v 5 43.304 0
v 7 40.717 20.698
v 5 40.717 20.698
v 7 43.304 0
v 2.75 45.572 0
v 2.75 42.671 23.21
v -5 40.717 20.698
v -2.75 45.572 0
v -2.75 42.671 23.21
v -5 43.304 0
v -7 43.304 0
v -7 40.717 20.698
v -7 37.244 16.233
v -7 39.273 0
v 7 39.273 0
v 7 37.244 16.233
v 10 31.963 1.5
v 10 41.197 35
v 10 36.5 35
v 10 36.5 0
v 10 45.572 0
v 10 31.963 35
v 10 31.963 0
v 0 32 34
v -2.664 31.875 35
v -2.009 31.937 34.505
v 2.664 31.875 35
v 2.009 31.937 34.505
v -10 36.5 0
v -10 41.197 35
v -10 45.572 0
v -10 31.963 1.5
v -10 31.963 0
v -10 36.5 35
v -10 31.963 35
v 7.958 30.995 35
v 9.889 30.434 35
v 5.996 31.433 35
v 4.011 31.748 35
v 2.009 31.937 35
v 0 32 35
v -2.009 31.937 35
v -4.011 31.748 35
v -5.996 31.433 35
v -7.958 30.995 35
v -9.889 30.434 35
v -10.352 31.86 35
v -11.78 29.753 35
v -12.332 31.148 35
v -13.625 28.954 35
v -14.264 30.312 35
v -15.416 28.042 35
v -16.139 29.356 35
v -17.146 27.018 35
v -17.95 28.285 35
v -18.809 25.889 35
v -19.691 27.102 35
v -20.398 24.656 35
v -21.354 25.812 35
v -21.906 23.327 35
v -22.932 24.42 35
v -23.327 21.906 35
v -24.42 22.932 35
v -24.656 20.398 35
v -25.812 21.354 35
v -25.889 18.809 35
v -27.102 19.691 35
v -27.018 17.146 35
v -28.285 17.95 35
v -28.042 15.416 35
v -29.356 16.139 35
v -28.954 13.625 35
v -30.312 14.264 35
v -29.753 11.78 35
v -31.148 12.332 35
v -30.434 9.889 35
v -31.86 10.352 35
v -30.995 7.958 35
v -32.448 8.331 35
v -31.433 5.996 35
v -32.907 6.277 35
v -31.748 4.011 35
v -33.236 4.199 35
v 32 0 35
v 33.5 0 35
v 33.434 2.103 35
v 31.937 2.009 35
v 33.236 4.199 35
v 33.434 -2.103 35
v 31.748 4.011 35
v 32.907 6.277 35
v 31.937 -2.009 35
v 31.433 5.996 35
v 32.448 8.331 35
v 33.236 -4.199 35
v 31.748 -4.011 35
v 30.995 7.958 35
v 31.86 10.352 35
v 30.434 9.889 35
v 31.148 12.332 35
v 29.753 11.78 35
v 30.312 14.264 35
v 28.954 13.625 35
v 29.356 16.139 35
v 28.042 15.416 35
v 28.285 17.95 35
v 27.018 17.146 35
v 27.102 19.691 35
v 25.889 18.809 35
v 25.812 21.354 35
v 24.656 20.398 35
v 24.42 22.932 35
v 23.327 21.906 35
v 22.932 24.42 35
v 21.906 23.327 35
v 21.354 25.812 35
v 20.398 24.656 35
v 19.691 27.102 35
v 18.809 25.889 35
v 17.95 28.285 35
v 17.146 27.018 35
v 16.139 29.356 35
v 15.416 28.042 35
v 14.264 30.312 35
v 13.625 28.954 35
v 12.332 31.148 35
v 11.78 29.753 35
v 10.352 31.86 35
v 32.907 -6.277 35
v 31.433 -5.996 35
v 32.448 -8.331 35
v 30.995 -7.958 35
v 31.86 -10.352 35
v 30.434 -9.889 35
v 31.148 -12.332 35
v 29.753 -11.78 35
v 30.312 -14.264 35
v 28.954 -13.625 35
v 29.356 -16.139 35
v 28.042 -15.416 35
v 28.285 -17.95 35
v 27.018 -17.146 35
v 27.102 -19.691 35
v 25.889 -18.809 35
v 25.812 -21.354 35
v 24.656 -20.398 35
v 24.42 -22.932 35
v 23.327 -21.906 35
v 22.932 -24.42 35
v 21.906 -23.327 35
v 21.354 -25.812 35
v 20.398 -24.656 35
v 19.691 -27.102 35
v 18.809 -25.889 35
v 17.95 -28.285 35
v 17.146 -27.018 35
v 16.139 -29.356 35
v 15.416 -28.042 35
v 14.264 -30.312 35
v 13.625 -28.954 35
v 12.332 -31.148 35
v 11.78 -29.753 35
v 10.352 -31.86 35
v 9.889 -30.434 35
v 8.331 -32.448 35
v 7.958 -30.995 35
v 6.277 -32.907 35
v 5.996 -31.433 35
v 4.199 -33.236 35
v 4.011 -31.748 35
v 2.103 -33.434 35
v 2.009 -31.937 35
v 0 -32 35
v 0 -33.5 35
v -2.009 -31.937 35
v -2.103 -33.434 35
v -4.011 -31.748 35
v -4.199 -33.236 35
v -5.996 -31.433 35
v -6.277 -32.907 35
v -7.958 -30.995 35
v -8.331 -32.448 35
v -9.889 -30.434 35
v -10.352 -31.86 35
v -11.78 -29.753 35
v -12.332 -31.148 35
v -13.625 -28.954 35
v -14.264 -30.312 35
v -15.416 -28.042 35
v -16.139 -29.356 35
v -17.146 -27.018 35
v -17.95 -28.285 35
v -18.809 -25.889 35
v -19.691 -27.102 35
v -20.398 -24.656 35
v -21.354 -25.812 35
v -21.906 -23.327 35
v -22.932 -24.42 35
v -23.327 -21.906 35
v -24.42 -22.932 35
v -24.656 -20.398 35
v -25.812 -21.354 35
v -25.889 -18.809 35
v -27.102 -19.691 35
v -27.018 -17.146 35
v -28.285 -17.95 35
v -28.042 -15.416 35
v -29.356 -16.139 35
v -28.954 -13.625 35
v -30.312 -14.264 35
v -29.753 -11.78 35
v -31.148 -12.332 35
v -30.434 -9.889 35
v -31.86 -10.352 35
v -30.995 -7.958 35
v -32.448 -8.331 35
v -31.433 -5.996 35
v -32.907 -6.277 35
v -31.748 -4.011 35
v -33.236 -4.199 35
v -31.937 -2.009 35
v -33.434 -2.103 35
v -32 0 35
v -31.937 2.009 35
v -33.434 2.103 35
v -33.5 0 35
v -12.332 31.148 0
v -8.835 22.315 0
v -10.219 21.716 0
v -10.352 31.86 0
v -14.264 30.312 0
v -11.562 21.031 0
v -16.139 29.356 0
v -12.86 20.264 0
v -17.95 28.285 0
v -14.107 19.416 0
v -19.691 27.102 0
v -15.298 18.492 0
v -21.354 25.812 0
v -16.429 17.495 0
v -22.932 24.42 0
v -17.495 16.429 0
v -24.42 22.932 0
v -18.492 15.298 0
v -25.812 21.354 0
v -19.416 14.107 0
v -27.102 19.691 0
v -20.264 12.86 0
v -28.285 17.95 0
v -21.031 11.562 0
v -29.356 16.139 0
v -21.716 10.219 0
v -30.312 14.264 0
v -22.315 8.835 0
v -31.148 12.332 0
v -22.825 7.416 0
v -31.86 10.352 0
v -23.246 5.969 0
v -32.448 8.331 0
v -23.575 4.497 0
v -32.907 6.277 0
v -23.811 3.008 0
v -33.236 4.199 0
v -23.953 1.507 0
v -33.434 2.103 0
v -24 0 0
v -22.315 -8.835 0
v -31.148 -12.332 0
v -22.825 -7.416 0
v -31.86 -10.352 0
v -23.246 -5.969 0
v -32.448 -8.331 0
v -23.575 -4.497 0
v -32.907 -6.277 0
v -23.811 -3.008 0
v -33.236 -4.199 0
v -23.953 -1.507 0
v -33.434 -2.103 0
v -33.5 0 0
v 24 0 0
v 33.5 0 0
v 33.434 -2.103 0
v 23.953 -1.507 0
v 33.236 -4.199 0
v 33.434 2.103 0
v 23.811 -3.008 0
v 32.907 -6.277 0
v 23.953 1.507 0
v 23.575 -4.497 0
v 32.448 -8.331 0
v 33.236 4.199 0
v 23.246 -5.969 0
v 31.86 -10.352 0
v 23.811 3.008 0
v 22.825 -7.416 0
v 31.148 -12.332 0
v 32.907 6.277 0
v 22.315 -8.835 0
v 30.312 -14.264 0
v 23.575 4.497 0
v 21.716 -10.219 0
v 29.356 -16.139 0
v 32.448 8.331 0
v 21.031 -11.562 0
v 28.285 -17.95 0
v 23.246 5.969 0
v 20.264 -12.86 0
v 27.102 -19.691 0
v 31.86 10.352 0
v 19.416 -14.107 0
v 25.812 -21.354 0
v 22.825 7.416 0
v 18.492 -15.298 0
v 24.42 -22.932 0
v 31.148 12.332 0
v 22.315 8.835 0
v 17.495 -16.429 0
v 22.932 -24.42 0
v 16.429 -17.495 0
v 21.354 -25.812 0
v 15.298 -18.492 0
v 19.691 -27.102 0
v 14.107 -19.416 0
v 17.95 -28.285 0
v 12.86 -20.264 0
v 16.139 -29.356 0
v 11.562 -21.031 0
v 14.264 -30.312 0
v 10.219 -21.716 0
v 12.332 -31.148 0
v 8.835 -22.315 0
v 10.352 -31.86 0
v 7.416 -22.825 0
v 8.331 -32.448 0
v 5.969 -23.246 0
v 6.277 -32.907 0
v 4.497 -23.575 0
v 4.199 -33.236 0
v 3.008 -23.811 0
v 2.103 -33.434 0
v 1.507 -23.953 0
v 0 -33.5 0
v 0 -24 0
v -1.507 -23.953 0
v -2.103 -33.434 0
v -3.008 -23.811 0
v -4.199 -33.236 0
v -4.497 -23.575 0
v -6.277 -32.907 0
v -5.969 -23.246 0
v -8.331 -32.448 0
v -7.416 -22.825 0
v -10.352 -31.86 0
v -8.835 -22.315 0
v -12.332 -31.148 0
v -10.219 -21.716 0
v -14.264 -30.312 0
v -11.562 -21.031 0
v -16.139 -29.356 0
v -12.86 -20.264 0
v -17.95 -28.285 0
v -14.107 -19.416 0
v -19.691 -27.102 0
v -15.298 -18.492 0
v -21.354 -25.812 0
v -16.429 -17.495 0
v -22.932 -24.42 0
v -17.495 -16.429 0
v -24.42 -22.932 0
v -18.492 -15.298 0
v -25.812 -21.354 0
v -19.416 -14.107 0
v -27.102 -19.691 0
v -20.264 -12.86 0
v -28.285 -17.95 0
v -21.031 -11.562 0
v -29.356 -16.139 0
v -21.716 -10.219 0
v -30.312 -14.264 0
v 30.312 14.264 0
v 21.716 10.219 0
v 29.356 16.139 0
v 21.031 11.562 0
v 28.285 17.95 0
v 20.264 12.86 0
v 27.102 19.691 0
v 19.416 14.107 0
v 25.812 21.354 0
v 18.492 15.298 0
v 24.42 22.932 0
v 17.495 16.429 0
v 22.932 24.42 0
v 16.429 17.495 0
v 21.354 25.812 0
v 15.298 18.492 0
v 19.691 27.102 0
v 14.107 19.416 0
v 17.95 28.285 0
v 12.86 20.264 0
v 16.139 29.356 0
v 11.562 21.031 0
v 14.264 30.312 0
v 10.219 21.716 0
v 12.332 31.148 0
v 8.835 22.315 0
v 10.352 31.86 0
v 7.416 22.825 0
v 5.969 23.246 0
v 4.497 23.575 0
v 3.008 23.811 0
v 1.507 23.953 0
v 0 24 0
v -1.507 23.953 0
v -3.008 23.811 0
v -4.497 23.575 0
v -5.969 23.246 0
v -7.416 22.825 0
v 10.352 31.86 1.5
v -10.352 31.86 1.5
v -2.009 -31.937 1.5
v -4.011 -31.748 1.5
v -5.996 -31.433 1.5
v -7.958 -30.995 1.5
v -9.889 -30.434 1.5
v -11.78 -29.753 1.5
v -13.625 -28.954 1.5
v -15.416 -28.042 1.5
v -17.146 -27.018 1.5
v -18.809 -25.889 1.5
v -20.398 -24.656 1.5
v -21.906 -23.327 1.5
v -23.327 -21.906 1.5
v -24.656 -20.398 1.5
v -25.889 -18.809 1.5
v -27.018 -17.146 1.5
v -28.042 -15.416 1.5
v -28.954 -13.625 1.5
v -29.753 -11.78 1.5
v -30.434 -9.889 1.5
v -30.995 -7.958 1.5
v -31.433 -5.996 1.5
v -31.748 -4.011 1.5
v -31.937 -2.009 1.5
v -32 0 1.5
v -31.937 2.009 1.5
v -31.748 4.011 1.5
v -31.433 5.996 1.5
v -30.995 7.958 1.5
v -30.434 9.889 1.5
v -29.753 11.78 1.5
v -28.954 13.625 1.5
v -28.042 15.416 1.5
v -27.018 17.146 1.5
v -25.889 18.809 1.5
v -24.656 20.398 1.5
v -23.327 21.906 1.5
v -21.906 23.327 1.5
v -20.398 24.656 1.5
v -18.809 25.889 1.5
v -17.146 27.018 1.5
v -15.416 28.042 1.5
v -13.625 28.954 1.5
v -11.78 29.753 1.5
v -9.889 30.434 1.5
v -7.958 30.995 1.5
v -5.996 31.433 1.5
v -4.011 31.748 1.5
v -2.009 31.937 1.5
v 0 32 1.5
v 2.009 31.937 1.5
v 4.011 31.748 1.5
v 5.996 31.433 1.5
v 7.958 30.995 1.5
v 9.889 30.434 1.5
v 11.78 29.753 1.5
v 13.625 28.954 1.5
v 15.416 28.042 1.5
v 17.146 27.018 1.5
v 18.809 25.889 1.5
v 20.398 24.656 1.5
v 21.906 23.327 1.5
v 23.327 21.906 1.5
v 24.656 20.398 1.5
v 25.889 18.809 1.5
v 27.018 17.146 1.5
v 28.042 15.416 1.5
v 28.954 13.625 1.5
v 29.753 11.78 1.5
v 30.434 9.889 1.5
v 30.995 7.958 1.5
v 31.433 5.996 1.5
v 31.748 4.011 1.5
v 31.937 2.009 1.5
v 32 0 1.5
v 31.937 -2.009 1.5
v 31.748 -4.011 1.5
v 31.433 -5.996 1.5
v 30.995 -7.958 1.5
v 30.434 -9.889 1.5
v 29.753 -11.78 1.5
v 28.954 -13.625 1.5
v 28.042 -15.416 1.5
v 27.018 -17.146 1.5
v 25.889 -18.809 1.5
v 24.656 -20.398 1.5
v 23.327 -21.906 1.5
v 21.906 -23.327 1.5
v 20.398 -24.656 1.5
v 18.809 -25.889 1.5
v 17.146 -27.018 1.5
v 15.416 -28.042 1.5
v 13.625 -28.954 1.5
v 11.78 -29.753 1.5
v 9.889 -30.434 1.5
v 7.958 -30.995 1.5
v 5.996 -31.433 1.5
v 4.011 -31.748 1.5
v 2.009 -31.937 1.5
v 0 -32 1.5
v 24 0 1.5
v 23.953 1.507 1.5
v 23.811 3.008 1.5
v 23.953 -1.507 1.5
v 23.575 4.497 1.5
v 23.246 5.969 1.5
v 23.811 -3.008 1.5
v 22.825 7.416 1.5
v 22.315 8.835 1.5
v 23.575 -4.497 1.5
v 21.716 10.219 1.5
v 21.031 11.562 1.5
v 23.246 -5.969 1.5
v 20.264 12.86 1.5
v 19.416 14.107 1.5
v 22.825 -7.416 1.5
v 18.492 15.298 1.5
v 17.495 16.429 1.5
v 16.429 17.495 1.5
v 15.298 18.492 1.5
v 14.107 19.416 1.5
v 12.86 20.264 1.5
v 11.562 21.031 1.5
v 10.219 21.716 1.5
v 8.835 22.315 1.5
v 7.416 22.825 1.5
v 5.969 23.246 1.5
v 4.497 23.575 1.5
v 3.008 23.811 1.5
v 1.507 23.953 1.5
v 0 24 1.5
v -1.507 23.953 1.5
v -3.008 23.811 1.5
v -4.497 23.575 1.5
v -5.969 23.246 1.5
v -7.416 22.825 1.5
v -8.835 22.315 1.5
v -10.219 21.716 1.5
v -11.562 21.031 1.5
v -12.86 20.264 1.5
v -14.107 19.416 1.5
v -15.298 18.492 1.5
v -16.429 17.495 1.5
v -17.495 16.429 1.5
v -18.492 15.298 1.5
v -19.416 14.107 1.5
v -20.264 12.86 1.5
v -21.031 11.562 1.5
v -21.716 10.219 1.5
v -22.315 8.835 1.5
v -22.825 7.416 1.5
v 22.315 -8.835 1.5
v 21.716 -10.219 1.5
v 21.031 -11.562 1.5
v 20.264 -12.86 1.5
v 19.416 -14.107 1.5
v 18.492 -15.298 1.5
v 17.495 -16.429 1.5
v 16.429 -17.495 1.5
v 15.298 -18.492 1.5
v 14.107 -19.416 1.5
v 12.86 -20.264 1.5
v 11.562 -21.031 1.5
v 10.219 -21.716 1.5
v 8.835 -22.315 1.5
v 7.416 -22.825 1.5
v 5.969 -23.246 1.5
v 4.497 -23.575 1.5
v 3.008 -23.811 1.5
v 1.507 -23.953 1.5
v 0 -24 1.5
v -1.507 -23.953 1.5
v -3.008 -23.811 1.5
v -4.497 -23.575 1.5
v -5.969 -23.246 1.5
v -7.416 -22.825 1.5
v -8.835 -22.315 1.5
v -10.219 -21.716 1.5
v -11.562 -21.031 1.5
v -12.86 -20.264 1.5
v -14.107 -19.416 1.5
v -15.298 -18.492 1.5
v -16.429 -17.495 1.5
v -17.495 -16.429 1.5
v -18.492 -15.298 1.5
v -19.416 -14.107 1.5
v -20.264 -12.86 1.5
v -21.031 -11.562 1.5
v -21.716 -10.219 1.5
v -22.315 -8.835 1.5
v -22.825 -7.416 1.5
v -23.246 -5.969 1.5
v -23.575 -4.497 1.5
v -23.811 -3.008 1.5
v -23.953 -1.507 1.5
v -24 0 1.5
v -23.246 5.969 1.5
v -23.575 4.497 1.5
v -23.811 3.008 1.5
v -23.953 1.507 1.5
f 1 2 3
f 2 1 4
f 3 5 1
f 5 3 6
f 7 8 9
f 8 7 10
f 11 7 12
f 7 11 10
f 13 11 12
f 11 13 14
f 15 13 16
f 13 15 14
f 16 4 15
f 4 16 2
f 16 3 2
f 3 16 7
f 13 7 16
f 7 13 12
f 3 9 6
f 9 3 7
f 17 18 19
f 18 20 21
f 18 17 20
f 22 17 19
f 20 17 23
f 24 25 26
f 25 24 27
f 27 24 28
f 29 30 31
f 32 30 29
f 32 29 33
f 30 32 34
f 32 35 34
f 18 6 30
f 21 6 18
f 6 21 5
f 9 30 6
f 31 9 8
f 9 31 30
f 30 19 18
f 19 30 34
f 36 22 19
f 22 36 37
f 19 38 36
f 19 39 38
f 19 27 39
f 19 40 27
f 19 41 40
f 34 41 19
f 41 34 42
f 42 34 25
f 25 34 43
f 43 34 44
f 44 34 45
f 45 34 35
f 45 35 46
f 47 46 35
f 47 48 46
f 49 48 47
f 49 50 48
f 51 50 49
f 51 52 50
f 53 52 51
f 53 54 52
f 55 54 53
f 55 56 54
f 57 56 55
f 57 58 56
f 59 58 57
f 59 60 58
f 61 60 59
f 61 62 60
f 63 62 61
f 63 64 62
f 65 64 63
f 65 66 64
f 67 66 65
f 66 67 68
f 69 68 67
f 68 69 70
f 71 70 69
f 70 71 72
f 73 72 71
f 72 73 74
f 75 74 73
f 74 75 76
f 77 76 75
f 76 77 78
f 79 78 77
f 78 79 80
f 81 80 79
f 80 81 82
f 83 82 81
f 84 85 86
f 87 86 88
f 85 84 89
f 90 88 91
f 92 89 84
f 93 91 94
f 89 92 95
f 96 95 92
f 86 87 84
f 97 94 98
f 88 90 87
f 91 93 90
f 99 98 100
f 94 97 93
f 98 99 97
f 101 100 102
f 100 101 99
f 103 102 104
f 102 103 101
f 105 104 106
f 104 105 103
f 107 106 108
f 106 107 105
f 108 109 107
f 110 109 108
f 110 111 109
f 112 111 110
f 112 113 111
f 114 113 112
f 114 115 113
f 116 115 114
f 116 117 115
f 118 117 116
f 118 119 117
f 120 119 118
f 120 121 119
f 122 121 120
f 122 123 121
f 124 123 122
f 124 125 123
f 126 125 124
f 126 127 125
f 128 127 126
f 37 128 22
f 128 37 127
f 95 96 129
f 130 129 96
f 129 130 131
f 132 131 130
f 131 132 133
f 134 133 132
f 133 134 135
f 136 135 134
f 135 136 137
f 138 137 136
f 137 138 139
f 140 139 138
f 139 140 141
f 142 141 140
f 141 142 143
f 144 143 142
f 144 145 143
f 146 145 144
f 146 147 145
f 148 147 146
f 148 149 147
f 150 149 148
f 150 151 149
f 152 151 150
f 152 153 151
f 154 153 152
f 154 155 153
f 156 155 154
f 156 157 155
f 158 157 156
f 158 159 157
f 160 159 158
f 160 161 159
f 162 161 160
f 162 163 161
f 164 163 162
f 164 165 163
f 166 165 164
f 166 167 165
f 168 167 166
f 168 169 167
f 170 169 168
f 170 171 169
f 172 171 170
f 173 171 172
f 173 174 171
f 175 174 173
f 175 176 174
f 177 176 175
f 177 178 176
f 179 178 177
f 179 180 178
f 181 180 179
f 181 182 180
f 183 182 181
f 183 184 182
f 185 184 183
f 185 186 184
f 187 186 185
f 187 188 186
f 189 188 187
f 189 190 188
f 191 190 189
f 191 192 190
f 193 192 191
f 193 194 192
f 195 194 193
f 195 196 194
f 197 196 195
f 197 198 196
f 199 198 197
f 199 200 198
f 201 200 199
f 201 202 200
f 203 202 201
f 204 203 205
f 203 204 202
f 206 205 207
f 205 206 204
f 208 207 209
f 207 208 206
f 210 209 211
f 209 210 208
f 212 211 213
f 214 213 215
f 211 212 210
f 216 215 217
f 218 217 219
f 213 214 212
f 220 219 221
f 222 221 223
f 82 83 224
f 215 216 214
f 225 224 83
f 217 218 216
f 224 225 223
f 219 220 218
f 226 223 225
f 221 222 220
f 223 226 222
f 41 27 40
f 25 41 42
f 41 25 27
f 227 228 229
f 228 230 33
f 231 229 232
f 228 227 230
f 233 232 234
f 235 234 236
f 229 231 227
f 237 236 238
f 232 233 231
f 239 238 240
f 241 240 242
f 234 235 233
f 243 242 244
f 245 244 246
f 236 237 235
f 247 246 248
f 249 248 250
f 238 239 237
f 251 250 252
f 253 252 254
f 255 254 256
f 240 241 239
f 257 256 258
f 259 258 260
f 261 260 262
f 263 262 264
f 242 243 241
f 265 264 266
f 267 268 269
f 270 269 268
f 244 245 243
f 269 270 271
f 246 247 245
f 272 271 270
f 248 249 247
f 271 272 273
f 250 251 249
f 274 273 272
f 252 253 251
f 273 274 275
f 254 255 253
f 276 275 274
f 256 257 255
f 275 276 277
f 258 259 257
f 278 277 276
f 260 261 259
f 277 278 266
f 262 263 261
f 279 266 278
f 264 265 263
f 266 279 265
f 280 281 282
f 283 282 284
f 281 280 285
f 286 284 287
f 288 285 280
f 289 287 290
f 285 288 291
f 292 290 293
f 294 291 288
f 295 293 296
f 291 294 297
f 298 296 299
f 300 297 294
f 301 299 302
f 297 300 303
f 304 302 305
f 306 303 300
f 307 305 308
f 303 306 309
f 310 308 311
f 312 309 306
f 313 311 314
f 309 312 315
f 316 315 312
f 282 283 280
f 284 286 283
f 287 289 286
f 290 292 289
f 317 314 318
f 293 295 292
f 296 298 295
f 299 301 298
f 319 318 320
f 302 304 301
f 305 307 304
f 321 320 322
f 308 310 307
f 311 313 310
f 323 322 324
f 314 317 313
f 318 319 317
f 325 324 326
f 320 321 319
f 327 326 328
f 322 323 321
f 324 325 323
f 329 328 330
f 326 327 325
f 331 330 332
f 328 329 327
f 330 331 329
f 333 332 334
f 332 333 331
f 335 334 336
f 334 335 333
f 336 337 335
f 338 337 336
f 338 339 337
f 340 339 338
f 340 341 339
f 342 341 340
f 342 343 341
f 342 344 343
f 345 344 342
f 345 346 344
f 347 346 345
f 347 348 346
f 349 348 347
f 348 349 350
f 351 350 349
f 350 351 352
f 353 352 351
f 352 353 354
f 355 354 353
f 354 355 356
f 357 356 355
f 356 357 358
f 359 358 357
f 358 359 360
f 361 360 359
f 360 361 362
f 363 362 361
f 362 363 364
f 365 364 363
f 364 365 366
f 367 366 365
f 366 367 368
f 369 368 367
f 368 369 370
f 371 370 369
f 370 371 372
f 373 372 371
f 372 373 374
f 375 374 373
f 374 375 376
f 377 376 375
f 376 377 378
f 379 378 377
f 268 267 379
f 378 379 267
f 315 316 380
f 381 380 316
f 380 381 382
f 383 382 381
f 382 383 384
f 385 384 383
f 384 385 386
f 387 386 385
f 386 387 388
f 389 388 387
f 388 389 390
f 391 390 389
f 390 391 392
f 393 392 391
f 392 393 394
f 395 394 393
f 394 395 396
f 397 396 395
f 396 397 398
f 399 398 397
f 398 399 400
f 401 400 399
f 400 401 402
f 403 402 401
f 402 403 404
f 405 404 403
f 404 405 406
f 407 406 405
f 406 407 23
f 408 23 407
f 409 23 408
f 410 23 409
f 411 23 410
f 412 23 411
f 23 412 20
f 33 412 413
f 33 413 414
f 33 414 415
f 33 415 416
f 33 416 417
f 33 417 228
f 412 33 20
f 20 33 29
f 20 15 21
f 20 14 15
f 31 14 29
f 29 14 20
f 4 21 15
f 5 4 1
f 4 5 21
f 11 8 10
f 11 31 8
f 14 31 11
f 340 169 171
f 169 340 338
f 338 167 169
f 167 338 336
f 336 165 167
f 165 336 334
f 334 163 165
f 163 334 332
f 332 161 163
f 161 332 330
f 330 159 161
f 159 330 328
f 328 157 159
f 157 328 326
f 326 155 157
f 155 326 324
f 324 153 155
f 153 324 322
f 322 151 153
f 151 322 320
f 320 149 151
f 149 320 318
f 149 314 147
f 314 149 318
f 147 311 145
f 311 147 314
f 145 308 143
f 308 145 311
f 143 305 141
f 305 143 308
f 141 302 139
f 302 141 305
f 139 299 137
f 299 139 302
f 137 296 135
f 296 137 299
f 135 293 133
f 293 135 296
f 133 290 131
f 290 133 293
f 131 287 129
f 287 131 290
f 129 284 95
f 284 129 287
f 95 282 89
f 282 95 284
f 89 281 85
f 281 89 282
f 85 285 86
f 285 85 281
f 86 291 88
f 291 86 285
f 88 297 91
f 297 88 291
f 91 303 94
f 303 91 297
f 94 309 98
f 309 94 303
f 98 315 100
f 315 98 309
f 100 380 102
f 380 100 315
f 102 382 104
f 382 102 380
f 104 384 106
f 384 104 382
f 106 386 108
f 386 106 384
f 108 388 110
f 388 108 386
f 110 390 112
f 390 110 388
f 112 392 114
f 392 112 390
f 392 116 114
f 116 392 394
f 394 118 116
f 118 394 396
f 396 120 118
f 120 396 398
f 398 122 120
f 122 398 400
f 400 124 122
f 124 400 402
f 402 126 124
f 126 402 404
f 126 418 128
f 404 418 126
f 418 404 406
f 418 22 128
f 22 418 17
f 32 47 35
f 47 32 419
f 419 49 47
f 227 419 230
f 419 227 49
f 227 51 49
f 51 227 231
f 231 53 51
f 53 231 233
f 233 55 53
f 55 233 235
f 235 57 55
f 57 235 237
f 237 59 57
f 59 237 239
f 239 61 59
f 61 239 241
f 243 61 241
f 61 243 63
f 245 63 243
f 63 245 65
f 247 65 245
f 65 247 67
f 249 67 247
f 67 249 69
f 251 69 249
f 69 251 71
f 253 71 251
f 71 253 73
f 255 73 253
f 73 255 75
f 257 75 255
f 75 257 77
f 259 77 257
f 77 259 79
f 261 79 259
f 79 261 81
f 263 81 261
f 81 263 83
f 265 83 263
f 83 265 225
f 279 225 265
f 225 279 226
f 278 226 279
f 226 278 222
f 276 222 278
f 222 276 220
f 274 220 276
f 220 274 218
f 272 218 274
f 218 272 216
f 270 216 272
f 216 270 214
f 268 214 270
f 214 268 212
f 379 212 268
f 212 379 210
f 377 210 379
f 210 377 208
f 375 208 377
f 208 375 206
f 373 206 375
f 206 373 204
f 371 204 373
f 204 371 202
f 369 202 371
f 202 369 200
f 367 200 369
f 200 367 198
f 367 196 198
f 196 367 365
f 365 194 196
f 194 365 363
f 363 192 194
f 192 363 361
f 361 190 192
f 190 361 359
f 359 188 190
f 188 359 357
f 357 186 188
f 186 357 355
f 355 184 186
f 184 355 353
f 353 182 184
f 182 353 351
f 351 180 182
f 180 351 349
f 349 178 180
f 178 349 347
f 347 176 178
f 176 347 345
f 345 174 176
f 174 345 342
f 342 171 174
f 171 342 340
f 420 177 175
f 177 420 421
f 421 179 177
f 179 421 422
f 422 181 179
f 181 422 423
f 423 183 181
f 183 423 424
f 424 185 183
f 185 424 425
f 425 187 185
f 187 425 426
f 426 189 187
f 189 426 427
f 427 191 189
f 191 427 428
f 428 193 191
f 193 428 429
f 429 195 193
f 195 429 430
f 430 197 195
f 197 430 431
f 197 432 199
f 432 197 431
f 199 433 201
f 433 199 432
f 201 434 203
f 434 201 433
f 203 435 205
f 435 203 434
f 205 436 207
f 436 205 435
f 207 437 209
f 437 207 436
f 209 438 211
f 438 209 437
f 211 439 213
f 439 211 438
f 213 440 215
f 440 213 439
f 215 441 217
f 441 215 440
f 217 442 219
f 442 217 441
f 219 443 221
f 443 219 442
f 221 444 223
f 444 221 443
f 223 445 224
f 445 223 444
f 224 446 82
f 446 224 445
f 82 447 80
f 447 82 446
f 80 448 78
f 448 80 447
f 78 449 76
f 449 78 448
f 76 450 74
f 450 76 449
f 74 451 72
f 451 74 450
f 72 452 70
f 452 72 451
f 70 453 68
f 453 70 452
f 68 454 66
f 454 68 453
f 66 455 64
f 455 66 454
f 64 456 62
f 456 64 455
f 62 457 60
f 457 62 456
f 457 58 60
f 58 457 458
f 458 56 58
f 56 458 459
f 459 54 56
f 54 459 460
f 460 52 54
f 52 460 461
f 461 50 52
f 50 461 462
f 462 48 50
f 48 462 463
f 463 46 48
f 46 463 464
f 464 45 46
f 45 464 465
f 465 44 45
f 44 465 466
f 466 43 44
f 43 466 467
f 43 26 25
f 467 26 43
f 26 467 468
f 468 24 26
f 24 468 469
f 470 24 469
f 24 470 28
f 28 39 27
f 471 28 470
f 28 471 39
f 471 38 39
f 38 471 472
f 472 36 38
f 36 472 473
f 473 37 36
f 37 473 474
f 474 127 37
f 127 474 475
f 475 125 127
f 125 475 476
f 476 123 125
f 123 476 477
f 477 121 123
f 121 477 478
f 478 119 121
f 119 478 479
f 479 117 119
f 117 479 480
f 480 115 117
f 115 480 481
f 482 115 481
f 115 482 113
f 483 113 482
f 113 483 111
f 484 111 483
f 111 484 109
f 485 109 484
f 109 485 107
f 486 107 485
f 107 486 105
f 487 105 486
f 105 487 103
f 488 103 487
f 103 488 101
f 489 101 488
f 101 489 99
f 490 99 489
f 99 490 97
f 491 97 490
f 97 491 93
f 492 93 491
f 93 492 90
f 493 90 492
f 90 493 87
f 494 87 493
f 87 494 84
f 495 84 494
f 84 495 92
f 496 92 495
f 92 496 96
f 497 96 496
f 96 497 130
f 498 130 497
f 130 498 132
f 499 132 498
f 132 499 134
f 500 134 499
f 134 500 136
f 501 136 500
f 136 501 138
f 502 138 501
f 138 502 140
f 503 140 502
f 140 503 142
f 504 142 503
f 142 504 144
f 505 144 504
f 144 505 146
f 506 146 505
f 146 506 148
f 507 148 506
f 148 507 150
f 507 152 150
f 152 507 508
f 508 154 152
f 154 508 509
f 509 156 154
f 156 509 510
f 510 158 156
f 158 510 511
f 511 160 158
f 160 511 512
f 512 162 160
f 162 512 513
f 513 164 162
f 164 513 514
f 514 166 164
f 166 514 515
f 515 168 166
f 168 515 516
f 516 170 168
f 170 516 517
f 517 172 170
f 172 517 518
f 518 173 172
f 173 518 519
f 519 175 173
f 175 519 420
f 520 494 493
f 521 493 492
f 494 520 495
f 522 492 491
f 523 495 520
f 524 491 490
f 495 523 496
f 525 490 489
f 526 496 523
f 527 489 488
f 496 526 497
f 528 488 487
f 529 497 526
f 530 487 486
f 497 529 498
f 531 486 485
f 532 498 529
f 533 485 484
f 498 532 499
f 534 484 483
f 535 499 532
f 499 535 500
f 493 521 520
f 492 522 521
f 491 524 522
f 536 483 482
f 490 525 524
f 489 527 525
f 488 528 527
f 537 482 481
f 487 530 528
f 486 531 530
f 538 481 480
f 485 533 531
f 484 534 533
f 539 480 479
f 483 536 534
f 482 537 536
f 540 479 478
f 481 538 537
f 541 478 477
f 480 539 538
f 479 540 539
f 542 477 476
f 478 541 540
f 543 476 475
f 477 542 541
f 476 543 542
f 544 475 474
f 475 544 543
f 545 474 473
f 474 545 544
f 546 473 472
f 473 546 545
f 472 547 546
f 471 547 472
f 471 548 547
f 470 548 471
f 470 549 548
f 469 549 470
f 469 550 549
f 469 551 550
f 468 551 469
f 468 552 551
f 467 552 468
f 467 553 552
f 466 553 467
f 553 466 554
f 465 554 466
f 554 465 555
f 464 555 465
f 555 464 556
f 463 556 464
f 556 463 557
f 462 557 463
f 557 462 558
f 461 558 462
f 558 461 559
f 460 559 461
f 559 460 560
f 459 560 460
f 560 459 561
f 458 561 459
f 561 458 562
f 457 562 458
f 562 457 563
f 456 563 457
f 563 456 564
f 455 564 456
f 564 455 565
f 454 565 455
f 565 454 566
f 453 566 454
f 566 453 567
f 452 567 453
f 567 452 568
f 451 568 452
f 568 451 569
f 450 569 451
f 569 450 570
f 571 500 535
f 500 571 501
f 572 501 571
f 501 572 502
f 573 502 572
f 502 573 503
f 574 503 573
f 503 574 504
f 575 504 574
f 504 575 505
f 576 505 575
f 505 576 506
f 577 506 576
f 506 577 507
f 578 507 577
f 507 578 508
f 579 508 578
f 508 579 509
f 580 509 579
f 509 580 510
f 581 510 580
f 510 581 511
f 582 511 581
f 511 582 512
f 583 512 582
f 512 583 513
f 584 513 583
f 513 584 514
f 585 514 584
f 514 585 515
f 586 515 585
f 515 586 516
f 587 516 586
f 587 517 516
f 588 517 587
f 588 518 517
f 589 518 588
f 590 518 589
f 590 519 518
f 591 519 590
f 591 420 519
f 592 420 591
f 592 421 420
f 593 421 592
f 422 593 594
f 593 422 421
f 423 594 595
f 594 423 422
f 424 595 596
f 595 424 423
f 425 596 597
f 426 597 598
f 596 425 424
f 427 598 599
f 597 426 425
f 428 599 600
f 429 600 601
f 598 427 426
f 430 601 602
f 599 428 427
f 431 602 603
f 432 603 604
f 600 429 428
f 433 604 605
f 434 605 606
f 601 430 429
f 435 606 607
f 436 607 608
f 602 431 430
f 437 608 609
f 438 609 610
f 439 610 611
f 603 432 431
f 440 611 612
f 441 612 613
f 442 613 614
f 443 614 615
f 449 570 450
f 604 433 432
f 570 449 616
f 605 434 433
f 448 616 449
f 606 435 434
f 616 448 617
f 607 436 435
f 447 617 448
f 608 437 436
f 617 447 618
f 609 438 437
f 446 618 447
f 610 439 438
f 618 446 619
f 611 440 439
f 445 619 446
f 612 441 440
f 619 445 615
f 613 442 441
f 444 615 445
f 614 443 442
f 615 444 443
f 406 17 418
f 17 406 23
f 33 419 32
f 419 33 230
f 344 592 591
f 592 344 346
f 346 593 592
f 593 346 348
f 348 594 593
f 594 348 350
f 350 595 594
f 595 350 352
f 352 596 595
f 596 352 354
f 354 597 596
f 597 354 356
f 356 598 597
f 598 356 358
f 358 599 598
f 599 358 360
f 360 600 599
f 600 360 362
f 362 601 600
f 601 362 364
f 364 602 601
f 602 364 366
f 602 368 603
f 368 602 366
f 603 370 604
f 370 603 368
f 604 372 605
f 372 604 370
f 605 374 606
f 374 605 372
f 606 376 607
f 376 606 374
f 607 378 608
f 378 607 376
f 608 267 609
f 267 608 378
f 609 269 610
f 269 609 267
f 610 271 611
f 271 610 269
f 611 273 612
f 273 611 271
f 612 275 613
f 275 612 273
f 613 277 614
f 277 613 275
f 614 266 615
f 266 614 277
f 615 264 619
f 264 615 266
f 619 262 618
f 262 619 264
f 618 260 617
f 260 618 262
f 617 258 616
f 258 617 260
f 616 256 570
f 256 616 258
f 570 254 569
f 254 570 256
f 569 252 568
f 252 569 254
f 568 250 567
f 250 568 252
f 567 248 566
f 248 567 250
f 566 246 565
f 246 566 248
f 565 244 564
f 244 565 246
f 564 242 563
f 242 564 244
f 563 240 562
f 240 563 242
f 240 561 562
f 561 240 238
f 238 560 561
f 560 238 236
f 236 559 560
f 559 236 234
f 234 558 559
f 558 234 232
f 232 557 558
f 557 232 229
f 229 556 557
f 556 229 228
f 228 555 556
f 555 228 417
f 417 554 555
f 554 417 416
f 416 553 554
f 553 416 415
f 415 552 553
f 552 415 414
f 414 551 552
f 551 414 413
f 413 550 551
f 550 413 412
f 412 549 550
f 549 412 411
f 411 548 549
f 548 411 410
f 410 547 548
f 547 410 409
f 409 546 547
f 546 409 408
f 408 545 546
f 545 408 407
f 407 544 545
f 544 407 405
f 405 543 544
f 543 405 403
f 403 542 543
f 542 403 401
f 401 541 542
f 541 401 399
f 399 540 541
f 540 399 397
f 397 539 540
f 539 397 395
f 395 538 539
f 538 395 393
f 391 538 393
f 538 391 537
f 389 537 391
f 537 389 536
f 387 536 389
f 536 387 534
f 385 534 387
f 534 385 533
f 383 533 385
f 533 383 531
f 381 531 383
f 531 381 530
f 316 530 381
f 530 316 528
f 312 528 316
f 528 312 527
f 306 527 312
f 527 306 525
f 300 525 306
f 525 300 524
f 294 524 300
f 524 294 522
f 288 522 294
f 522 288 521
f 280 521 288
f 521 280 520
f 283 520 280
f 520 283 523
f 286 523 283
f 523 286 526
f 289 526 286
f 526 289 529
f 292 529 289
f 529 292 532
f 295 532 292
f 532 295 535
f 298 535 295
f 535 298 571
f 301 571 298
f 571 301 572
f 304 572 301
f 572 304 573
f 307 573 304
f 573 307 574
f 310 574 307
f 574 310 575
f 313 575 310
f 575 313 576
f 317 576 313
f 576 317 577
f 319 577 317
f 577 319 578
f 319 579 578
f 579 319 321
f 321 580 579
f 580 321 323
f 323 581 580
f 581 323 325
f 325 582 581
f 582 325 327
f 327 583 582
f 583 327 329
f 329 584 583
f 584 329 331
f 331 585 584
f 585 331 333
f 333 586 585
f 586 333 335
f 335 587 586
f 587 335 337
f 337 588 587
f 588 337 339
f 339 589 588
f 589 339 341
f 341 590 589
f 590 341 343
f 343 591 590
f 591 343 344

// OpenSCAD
// file: defs.scad
width = 10;
height = 80;
angle = atan (width / height);
diag = height / cos(angle) + width * tan(angle);
slack = 0.75;

up_down_trim = width*sin(angle);

module slot_poly (slot_slack) {
    polygon ([
        [7-slot_slack, -7+slot_slack],
        [-7+slot_slack, -7+slot_slack],
        [-7+slot_slack, -3-slot_slack],
        [-5, -3-slot_slack],
        [-2+slot_slack, 0],
        [2-slot_slack, 0],
        [5, -3-slot_slack],
        [7-slot_slack, -3-slot_slack]
    ]);
}
// main file
include <defs.scad>

$fn=100;

h = 35;

difference () {
    translate ([0, 36.5, -2])
    rotate ([angle, 0, 0]) {
        difference () {
            linear_extrude (h+5) {
                polygon ([
                    [10, width-slack],
                    [-10, width-slack],
                    [-10, 0],
                    [10, 0]
                ]);
            }
            difference () {
                linear_extrude (h-3)
                translate ([0, width, 0])
                        slot_poly (0);
                translate ([-15, 0, h-20])
                rotate ([45, 0, 0]) cube (30);
            }
        }
    }
    translate ([0, 0, h+50])
        cube (100, center=true);
    translate ([0, 0, -50])
        cube (100, center=true);
}

linear_extrude (h) {
    difference () {
        union () {
            circle (33.5);
            polygon ([
                [10, 36.5],
                [-10, 36.5],
                [-10, 15],
                [10, 15]
            ]);
        }
        circle (32);
    }
}
linear_extrude (1.5)
    difference () {
        circle (33.5);
        circle (24);
    }
